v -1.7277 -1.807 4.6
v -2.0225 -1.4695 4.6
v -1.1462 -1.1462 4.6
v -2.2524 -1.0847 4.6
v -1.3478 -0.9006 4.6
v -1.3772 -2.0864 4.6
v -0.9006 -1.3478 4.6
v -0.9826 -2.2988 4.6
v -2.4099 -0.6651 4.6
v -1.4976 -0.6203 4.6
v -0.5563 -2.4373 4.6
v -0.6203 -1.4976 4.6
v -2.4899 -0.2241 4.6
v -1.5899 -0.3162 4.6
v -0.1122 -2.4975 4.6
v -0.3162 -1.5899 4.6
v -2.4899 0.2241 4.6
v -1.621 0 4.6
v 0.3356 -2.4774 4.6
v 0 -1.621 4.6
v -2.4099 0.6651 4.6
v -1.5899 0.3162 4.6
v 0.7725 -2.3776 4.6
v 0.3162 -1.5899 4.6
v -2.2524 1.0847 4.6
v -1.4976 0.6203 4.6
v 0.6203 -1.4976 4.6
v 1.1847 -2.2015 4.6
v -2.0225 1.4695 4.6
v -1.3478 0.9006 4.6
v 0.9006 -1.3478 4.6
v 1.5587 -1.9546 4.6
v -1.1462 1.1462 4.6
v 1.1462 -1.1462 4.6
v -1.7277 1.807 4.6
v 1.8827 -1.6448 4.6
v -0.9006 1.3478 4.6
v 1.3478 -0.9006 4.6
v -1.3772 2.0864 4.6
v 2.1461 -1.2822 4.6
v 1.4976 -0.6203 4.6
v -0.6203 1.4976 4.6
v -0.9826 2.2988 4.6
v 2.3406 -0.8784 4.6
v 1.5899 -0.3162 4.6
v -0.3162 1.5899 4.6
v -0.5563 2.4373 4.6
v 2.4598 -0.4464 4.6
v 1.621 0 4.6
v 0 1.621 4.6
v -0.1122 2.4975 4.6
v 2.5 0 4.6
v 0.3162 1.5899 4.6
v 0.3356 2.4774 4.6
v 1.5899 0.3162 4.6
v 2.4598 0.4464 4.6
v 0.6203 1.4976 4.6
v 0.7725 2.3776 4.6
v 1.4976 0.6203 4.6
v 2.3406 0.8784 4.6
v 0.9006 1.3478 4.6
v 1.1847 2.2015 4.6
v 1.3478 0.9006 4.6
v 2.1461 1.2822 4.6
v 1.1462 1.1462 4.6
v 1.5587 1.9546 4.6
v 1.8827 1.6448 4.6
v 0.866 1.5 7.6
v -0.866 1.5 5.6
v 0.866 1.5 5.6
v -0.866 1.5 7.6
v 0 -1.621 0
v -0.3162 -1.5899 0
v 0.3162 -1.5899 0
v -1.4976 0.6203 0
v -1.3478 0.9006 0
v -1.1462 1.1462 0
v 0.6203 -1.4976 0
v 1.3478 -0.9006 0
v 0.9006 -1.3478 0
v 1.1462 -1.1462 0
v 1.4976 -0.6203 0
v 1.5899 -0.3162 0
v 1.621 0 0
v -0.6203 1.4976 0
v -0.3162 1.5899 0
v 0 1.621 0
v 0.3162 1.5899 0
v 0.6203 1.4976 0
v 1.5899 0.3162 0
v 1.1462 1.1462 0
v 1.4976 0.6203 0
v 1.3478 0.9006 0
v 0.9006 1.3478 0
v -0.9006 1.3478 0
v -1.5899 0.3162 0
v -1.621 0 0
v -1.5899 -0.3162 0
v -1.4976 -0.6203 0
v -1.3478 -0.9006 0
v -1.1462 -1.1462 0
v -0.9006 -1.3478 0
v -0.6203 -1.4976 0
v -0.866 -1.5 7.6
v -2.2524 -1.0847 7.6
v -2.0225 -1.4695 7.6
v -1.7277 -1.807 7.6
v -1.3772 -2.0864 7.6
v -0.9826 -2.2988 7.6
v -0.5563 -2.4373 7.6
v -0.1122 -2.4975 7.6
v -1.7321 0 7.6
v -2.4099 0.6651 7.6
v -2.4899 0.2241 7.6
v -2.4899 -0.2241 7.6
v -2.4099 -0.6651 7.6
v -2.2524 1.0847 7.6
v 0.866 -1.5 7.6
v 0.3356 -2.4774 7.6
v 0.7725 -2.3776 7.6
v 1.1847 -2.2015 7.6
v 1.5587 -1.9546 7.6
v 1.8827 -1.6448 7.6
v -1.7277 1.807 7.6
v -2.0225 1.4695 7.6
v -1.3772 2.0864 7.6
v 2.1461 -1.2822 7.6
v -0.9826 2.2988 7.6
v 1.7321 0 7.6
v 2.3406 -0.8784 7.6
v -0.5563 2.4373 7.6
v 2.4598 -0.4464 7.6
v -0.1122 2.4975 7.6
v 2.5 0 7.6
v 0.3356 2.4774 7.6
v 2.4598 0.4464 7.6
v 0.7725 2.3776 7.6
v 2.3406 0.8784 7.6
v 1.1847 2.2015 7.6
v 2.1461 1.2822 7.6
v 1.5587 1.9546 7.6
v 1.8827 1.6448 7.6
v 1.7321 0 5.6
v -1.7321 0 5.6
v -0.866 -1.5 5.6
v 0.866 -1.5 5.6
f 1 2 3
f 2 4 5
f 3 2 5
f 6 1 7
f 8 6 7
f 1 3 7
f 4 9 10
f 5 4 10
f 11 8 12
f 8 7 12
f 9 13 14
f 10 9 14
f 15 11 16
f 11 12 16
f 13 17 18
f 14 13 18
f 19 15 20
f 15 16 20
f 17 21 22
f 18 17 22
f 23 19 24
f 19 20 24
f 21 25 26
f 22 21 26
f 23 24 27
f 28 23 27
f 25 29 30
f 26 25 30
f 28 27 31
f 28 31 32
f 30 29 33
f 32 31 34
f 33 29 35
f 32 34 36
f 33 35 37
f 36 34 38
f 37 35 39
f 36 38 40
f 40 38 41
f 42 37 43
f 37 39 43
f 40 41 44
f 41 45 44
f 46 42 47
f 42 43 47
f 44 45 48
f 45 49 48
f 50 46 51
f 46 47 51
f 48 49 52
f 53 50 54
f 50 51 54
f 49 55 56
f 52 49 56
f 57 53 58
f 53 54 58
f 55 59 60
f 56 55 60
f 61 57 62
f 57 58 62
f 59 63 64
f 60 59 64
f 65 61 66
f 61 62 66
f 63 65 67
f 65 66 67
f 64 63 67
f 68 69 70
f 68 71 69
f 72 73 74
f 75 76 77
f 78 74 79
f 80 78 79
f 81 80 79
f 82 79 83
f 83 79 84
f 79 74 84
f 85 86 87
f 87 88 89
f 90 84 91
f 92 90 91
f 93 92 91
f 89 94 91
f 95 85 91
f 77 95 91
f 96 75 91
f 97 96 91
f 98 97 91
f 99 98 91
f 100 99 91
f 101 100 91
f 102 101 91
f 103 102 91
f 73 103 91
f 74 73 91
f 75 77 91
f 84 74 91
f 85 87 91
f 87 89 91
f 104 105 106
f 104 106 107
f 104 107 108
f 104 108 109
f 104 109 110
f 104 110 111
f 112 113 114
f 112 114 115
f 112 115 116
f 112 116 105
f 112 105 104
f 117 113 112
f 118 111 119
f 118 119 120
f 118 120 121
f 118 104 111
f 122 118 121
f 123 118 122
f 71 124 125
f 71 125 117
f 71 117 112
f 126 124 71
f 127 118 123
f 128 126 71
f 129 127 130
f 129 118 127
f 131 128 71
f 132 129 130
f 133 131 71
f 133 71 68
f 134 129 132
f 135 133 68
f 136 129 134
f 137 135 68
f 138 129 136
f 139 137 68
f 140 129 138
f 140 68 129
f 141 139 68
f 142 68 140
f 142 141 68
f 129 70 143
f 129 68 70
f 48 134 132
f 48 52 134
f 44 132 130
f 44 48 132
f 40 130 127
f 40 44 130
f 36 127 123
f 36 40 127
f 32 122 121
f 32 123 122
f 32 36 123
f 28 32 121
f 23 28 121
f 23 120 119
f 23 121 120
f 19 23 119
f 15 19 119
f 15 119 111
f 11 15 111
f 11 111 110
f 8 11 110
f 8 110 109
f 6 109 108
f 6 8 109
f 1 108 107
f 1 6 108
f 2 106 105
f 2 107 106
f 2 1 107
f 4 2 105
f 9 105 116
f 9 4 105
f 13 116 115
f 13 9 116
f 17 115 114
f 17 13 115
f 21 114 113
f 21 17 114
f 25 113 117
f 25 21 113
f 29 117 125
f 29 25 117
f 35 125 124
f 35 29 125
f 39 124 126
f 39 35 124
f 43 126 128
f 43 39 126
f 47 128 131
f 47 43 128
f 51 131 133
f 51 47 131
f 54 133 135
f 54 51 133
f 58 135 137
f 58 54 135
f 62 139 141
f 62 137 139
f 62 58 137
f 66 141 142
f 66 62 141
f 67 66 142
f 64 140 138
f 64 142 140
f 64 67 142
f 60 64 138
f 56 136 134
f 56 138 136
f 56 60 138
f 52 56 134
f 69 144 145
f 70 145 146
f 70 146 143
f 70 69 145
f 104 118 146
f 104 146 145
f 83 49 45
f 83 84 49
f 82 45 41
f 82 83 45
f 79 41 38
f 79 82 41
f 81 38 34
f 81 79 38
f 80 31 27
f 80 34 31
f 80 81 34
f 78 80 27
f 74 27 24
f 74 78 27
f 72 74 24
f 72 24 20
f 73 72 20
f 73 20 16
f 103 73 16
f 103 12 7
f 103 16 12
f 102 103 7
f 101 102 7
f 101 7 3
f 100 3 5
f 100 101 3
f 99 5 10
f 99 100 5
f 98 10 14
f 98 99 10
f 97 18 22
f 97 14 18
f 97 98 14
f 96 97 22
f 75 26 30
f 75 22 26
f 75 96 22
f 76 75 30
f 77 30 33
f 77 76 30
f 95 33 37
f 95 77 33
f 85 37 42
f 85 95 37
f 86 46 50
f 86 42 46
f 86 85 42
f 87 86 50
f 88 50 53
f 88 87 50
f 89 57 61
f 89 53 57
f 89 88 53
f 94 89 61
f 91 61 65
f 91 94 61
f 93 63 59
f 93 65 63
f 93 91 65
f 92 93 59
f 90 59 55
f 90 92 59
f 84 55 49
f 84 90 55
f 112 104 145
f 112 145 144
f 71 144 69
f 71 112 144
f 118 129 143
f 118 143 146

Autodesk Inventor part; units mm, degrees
ref_plane "YZ Plane" through (0, 0, 0) normal (1, 0, 0) x (0, 1, 0)
ref_plane "XZ Plane" through (0, 0, 0) normal (0, 1, 0) x (-1, 0, 0)
ref_plane "XY Plane" through (0, 0, 0) normal (0, 0, 1) x (1, 0, 0)
sketch "Sketch1" plane through (0, 0, 0) normal (0, 0, 1) x (1, 0, 0)
  circle A0 centre (0, 0) radius 1.621
  dimension "d0" = 3.242
extrude "Extrusion1" add sketch "Sketch1" along normal blind 4.6
sketch "Sketch2" plane through (0, 0, 4.6) normal (0, 0, 1) x (1, 0, 0)
  circle A0 centre (0, 0) radius 2.5
  dimension "d3" = 5
extrude "Extrusion2" add sketch "Sketch2" along normal blind 3
sketch "Sketch3" plane through (0, 0, 7.6) normal (0, 0, 1) x (1, 0, 0)
  line L0 (0.866, 1.5) -> (1.7321, 0)
  line L1 (1.7321, 0) -> (0.866, -1.5)
  line L2 (0.866, -1.5) -> (-0.866, -1.5)
  line L3 (-0.866, -1.5) -> (-1.7321, 0)
  line L4 (-1.7321, 0) -> (-0.866, 1.5)
  line L5 (-0.866, 1.5) -> (0.866, 1.5)
  point P0 (0, 0)
  dimension "d14" = 3
extrude "Extrusion3" cut sketch "Sketch3" against normal blind 2
thread "Thread1" size "M4x0.7" class "6g" standard "ANSI Metric M Profile" full length
properties part number "M4 sujecion"
